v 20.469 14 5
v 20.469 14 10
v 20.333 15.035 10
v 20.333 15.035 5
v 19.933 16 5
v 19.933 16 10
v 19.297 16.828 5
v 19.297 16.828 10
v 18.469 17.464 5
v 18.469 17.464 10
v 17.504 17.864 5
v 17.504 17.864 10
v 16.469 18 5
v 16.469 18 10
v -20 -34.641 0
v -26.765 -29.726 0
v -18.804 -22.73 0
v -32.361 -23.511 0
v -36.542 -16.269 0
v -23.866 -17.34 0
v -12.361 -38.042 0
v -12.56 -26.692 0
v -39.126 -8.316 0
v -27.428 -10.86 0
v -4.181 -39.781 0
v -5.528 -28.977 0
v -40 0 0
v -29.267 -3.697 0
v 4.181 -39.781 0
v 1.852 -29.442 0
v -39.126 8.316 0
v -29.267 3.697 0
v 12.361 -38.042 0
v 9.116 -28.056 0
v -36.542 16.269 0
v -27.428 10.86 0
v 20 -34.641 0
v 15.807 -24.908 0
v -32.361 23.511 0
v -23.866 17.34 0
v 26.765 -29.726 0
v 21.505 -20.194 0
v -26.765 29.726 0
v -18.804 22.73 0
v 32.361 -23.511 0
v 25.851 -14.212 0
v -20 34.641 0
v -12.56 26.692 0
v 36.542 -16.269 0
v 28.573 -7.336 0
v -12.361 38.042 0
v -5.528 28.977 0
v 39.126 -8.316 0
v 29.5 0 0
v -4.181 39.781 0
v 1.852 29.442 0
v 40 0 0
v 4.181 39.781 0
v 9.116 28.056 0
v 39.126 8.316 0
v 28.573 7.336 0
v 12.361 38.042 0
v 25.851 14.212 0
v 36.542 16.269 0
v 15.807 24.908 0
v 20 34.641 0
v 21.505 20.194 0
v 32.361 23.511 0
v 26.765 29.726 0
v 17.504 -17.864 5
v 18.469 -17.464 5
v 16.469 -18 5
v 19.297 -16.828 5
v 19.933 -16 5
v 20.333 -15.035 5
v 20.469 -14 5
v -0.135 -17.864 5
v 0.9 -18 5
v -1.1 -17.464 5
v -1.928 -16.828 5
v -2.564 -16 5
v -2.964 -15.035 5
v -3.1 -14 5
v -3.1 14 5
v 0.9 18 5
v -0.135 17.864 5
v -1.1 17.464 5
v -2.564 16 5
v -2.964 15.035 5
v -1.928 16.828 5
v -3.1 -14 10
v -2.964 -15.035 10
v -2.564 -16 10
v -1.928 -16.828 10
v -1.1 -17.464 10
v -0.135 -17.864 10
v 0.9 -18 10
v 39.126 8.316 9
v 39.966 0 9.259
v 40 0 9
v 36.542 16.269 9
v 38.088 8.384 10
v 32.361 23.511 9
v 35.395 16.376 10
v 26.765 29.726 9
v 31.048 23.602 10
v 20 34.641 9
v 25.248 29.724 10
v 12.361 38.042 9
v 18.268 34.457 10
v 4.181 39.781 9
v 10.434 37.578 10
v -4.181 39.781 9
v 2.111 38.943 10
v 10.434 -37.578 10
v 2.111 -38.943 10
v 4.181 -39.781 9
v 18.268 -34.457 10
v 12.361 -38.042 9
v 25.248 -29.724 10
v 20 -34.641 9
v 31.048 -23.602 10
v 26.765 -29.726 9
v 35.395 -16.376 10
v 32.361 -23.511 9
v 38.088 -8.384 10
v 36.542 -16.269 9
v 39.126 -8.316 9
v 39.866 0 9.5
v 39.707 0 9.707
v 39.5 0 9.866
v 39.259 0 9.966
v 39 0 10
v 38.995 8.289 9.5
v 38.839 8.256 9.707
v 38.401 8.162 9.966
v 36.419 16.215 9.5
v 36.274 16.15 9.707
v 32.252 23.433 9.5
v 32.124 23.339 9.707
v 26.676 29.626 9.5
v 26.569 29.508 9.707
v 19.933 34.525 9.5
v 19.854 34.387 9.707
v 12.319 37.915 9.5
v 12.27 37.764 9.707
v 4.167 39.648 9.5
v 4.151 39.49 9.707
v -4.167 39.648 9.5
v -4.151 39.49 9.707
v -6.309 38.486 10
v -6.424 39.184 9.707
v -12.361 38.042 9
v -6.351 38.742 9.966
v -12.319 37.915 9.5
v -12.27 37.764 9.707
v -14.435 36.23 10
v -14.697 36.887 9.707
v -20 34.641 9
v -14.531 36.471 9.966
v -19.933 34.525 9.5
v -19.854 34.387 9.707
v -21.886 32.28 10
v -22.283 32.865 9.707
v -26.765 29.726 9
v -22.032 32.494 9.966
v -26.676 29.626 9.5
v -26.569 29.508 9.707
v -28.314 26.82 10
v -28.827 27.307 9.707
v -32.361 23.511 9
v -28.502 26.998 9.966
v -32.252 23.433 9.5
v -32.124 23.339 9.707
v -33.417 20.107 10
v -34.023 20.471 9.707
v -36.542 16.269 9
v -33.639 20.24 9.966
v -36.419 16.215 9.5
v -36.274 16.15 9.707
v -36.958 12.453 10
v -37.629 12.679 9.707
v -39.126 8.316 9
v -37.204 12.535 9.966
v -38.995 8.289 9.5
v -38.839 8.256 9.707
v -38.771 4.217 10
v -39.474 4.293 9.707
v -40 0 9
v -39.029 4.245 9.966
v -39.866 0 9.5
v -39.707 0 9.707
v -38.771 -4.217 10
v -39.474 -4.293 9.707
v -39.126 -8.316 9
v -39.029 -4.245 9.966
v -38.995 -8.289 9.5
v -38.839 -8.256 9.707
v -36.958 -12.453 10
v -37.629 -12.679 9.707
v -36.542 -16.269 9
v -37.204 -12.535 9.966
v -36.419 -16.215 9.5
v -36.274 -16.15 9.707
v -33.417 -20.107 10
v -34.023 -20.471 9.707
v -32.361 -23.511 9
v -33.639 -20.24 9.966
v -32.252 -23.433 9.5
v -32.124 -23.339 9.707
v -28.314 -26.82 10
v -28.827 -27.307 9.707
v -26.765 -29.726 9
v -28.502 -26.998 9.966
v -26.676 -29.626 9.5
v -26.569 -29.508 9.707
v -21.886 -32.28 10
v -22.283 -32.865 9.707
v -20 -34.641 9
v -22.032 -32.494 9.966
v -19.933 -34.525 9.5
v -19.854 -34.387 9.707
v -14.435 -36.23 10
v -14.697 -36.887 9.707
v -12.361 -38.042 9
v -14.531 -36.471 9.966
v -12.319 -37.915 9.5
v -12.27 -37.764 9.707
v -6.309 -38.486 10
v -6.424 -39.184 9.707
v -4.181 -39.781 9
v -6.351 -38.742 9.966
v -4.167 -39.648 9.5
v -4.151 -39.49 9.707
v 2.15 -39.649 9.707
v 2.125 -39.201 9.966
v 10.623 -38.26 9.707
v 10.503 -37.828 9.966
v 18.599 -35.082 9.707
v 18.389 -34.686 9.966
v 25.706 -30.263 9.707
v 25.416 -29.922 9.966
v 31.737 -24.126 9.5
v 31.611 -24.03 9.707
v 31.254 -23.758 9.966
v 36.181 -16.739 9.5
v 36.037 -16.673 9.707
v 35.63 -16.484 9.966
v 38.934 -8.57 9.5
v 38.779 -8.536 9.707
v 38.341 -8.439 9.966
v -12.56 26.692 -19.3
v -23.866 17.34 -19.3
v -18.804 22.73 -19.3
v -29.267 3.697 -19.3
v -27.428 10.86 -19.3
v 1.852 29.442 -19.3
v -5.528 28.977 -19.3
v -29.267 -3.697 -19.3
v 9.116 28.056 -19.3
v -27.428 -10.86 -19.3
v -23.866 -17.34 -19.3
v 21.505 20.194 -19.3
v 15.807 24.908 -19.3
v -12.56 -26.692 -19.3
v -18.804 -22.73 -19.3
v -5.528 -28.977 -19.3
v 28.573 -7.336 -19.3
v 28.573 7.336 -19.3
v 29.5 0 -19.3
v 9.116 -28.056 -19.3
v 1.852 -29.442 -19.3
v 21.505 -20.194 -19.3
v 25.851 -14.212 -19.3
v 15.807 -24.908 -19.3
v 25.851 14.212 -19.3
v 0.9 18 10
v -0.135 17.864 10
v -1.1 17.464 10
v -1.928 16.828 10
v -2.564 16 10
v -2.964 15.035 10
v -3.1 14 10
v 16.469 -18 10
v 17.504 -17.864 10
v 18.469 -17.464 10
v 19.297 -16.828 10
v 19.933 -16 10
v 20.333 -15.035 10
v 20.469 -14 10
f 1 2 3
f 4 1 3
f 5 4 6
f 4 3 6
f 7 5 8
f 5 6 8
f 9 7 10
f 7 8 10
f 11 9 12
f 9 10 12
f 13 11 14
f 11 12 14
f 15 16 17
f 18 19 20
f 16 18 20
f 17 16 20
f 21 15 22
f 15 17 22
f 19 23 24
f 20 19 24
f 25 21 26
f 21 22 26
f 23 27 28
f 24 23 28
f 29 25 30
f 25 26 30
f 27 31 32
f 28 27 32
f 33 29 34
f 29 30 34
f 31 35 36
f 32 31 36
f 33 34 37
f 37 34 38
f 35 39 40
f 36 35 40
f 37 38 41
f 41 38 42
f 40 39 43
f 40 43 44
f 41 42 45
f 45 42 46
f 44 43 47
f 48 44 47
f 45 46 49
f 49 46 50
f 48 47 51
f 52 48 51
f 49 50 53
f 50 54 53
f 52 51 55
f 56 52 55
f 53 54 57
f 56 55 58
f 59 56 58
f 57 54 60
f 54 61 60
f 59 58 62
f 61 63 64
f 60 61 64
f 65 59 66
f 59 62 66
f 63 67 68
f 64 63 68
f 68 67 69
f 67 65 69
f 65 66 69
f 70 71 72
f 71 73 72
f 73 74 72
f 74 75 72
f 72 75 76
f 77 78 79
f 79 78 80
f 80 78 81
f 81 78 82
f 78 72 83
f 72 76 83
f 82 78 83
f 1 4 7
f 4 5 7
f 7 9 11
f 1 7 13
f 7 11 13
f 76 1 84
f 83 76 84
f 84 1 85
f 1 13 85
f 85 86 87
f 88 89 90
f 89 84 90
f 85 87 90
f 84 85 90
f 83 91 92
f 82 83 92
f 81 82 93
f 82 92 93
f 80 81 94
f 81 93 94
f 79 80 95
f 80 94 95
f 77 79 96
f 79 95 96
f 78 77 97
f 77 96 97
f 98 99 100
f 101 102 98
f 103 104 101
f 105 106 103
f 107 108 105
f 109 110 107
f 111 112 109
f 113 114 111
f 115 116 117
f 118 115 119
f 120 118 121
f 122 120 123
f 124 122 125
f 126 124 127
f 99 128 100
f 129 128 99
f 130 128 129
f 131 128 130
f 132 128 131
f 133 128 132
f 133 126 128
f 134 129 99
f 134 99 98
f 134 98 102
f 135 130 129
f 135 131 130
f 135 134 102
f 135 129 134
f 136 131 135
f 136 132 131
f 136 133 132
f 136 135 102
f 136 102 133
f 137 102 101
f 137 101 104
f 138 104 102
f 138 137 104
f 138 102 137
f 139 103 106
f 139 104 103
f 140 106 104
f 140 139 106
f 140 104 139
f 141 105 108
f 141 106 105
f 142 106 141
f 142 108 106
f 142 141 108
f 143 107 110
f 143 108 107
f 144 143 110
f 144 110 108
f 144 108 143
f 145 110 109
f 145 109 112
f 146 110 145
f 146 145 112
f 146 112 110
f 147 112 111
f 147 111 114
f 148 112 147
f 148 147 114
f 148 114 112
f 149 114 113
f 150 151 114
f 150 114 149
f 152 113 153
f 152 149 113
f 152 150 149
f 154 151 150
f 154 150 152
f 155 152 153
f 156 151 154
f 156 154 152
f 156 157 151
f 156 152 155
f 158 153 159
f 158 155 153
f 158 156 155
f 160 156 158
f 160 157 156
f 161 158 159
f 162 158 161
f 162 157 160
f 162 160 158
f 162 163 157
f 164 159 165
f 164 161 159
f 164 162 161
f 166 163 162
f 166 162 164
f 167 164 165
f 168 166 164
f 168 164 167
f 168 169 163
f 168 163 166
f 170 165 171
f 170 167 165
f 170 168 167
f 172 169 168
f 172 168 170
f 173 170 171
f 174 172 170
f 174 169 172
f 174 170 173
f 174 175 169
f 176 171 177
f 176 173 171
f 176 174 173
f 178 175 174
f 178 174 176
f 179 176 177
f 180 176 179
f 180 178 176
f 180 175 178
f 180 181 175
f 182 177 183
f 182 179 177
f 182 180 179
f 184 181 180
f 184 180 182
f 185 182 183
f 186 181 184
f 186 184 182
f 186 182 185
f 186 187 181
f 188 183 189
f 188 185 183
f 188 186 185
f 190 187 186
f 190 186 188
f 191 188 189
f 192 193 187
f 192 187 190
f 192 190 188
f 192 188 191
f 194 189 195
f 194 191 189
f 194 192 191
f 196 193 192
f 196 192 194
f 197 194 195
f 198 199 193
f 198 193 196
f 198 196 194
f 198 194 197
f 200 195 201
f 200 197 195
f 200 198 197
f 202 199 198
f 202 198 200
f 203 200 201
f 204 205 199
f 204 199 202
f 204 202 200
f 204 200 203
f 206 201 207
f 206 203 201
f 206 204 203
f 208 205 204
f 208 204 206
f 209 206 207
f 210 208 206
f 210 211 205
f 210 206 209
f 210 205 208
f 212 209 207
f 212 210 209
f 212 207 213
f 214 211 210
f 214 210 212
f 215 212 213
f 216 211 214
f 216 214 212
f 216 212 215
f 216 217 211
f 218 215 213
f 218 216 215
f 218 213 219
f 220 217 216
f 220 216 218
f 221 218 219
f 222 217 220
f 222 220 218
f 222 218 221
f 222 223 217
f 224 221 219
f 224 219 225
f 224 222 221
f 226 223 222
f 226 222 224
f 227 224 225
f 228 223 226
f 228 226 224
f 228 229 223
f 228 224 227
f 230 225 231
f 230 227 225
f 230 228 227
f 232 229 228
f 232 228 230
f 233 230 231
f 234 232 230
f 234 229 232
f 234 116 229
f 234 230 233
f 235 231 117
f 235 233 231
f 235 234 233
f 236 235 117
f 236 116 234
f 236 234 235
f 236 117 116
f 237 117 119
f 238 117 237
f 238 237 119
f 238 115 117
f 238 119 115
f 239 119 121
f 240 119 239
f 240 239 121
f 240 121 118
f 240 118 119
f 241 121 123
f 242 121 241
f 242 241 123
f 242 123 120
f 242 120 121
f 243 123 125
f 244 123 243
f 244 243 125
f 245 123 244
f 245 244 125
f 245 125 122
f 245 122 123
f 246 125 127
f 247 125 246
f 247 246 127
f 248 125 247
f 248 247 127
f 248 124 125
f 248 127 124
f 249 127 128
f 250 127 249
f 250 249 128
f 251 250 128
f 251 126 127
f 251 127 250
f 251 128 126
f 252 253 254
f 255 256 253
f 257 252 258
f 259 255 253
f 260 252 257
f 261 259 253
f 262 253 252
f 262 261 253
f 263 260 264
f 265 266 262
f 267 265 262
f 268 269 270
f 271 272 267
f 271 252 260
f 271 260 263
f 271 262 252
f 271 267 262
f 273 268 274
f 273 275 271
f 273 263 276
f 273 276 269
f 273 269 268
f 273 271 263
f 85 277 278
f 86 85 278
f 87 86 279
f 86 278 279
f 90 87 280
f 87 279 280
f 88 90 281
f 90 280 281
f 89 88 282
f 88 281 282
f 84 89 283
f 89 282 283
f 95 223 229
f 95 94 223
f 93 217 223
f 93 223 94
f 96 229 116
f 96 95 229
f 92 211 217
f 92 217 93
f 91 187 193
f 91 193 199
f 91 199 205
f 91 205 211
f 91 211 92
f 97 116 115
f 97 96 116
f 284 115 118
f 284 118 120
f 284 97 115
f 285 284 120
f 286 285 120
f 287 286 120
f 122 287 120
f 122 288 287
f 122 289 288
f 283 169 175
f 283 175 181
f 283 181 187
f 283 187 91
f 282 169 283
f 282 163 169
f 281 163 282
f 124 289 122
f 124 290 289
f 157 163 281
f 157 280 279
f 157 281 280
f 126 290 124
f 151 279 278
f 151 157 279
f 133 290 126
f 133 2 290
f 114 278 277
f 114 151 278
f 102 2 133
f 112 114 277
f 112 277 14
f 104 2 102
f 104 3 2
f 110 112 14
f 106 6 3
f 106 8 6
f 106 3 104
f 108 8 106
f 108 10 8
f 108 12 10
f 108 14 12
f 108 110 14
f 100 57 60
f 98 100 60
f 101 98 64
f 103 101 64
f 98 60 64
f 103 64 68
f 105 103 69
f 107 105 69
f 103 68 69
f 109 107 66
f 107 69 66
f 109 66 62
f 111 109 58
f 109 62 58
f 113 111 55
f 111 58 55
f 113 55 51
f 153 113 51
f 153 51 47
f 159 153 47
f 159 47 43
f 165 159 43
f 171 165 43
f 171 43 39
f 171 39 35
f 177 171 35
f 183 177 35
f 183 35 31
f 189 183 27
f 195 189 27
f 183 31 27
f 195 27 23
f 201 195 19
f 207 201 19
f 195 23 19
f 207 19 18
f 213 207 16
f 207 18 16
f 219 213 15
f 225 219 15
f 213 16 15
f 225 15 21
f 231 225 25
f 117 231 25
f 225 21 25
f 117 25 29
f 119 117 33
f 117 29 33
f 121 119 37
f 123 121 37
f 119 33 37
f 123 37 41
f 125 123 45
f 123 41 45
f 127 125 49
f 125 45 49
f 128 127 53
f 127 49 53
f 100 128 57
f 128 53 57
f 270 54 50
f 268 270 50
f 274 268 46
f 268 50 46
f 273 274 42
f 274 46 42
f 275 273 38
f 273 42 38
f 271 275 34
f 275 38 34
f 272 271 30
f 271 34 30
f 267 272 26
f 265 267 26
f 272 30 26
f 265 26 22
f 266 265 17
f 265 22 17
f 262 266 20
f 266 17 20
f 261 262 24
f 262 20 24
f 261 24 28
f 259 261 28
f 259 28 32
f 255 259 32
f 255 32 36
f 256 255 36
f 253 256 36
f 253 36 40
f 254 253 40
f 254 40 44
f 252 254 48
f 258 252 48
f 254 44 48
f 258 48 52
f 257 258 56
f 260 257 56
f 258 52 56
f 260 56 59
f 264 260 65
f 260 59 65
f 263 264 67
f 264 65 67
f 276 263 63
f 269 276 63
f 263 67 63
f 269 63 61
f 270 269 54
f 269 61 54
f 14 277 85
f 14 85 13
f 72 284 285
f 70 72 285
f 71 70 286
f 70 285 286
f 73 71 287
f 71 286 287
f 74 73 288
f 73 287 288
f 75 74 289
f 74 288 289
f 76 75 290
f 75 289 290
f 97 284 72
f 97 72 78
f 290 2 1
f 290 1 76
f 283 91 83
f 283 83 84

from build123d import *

# Parameters (mm, degrees)
SKETCH_R     = 40
PAD_DEPTH    = 10
FILLET_R     = 1
SKETCH001_R  = 29.5
PAD001_DEPTH = 19.3
POCKET_DEPTH = 5


with BuildPart() as part:
    # Sketch → Pad (new body)
    with BuildSketch(Plane.XY):
        Circle(SKETCH_R)
    extrude(amount=PAD_DEPTH)

    # Fillet
    fillet_edges = [part.edges().sort_by_distance(p)[0] for p in [
        (-40, 0, 10),
    ]]
    fillet(fillet_edges, radius=FILLET_R)

    # Sketch001 → Pad001 (new body)
    with BuildSketch(Plane(origin=(0, 0, 0), x_dir=(1, 0, 0), z_dir=(0, 0, -1))):
        Circle(SKETCH001_R)
    extrude(amount=PAD001_DEPTH)

    # Sketch002 → Pocket (cut)
    with BuildSketch(Plane.XY.offset(10)):
        with BuildLine():
            Line((0.9, 18), (16.468855, 18))
            ThreePointArc((20.468855, 14), (19.297282, 16.828427), (16.468855, 18))
            Line((20.468855, 14), (20.468855, -14))
            ThreePointArc((16.468855, -18), (19.297282, -16.828427), (20.468855, -14))
            Line((16.468855, -18), (0.9, -18))
            ThreePointArc((-3.1, -14), (-1.928427, -16.828427), (0.9, -18))
            Line((-3.1, -14), (-3.1, 14))
            ThreePointArc((0.9, 18), (-1.928427, 16.828427), (-3.1, 14))
        make_face()
    extrude(amount=-POCKET_DEPTH, mode=Mode.SUBTRACT)


solid = part.part
